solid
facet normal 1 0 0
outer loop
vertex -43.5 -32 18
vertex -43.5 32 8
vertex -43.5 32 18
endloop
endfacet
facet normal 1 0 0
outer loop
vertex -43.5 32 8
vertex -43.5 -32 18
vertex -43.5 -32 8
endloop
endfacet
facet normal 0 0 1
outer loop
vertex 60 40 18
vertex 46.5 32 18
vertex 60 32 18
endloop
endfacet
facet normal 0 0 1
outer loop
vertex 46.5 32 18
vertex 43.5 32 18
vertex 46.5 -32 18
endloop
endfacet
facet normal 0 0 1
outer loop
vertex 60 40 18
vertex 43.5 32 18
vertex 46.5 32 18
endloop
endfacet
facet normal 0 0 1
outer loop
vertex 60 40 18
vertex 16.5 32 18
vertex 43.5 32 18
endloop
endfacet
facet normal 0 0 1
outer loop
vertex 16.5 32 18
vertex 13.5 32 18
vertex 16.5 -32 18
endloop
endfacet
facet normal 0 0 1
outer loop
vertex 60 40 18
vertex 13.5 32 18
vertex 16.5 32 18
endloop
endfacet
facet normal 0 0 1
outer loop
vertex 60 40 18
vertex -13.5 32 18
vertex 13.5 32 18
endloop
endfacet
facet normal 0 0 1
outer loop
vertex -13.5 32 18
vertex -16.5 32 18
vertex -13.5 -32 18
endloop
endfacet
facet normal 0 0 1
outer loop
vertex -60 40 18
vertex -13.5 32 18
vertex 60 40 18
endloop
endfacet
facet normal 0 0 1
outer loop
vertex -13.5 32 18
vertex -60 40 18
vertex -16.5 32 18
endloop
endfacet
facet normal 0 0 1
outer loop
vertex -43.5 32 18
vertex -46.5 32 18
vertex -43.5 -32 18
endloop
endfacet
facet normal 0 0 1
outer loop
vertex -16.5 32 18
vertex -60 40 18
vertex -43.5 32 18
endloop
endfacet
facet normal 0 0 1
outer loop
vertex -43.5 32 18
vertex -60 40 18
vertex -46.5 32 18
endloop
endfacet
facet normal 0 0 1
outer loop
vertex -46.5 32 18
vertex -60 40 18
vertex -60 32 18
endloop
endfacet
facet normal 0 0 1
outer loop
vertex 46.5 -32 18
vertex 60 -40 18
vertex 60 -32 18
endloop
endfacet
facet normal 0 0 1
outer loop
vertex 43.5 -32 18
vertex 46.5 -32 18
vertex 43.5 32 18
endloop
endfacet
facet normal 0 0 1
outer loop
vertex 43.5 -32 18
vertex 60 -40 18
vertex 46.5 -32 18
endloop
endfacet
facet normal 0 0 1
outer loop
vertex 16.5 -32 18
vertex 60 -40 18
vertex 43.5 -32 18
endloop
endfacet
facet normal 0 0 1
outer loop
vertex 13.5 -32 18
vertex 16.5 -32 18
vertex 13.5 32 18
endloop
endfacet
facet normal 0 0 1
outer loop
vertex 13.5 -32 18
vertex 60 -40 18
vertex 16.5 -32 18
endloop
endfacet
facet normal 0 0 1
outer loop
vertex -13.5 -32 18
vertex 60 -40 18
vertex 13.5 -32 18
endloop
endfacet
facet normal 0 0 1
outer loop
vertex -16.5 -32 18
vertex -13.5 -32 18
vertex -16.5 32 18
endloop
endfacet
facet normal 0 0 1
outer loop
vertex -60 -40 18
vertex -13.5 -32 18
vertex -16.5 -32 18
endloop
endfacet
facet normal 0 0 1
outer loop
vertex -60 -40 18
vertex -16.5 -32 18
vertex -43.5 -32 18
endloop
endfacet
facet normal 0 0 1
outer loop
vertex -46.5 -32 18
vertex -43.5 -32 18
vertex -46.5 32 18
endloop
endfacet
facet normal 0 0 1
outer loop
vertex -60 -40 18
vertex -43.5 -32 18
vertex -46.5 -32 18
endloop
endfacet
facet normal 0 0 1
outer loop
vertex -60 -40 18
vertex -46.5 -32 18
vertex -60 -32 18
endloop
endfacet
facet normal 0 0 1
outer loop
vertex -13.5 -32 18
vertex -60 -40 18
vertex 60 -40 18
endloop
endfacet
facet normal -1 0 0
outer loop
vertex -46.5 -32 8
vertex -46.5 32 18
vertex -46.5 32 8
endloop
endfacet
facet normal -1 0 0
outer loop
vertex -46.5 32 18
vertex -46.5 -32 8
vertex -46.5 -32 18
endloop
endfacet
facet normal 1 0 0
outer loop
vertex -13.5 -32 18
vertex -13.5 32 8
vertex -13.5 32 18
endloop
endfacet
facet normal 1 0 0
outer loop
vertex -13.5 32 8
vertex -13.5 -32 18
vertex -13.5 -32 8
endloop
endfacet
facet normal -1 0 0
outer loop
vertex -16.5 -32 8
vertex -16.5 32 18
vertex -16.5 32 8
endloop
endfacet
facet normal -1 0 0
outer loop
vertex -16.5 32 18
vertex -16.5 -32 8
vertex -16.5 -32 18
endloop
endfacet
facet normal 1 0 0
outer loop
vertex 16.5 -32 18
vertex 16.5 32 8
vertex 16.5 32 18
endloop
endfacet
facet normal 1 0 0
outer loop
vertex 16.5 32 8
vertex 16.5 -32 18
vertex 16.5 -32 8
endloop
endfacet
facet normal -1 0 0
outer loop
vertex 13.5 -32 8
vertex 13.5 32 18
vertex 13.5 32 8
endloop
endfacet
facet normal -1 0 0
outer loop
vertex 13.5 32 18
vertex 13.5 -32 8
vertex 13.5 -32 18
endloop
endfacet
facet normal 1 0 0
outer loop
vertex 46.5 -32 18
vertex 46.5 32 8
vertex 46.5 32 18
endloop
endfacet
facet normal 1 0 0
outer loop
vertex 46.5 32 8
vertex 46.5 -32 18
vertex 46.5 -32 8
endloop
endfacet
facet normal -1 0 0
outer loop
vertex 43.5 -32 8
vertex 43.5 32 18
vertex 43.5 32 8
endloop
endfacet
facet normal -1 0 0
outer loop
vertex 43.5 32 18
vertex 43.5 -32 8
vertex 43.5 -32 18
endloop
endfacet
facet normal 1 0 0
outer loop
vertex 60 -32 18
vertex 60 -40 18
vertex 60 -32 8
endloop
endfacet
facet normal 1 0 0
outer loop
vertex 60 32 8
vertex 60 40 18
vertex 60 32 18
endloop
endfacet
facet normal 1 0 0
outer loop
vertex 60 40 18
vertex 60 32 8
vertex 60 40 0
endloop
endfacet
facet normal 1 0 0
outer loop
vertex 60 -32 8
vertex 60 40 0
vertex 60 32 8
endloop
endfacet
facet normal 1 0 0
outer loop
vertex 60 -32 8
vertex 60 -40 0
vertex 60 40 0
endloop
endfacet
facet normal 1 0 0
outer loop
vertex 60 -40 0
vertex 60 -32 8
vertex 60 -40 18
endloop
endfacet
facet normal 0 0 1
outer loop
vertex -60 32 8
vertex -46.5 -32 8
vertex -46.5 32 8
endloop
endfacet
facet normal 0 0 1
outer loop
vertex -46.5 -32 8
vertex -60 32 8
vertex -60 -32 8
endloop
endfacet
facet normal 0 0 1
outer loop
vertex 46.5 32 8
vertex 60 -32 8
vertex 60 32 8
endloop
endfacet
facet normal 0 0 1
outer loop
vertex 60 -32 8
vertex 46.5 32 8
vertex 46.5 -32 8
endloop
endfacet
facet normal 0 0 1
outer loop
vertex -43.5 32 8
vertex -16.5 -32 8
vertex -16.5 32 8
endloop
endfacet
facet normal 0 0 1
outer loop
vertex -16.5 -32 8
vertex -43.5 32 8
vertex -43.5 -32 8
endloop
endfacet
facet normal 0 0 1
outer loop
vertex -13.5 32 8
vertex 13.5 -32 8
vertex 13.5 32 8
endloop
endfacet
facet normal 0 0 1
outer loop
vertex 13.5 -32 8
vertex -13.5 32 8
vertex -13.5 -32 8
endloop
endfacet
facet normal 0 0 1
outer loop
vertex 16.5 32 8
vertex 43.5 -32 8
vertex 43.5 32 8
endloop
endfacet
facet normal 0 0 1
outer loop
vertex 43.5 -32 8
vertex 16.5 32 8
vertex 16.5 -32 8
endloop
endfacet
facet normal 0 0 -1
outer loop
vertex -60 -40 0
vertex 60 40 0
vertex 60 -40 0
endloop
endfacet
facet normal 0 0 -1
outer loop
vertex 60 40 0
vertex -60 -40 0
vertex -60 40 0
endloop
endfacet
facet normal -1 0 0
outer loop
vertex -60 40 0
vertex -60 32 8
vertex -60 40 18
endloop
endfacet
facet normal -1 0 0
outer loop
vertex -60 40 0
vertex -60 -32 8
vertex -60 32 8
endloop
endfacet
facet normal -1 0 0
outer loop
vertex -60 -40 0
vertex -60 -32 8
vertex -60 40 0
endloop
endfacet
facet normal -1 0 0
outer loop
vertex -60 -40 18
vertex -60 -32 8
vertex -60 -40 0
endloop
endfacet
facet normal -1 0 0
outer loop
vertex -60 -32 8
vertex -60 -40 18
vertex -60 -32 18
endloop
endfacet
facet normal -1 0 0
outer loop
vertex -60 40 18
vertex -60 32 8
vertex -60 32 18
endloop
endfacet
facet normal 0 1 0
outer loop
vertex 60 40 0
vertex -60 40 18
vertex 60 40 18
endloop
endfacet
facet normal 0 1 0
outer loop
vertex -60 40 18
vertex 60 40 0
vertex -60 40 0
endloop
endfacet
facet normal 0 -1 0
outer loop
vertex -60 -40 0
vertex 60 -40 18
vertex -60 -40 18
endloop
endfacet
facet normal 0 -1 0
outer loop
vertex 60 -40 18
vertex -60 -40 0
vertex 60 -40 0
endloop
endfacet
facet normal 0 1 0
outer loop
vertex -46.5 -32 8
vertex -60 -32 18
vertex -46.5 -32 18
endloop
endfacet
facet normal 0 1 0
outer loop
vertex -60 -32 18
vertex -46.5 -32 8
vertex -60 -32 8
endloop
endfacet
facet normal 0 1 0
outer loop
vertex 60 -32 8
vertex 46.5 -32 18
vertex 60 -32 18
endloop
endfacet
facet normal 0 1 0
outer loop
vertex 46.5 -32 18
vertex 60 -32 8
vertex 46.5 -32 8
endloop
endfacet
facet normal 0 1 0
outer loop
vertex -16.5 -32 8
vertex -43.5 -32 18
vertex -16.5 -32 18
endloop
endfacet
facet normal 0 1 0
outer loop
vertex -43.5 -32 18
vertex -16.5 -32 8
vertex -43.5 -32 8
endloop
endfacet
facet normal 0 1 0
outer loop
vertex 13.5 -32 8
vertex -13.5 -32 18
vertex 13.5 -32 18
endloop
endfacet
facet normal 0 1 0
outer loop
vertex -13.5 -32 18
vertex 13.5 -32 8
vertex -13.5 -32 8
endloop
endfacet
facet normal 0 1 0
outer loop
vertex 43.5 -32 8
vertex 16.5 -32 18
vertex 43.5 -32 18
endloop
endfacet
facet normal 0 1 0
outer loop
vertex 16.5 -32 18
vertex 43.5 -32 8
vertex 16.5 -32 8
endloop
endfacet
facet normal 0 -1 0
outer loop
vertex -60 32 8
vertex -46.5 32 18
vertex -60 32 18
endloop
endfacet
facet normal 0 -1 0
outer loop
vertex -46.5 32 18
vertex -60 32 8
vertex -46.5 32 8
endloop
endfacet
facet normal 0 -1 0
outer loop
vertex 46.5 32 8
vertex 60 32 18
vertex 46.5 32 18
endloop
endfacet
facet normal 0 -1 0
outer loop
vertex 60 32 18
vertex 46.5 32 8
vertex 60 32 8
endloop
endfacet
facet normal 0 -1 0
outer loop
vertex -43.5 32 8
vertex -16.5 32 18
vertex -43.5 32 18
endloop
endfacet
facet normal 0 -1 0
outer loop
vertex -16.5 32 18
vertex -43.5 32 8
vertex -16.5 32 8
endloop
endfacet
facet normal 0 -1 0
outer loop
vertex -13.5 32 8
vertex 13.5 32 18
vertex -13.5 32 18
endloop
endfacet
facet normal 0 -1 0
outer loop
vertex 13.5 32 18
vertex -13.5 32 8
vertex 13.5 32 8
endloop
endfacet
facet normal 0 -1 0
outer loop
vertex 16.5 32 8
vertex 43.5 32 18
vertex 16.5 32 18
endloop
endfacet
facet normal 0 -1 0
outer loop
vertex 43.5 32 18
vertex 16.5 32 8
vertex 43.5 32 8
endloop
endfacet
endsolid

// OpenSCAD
$fn = 32;

// ----------------------------------------------------------------------
// Rib frame 120 x 80 x 18
// 4 ribs at 30 mm pitch
// ----------------------------------------------------------------------

// --- parameters (mm) ---
frame = [120, 80, 8];  // base plate size (x, y, z)
rail_w = 8;            // side rail width
ribs = 4;              // number of ribs
rib_t = 3;             // rib thickness
rib_h = 10;            // rib height above the base plate
pitch = 30;            // pitch between rib centres

// --- derived feature positions (mm) ---
span = (ribs - 1) * pitch;          // = 90   distance between the outer ribs
origin_x = -span / 2;               // = -45   X of the first rib
rib_len = frame[1] - 2 * rail_w + 2;  // = 66   rib length, 1 mm into each rail
feature_centers = [
  [origin_x + 0 * pitch, 0],
  [origin_x + 1 * pitch, 0],
  [origin_x + 2 * pitch, 0],
  [origin_x + 3 * pitch, 0]
];   // rib centre line, drives the rib loop

// base plate, two side rails, then the ribs read straight off feature_centers
union() {
  translate([-frame[0] / 2, -frame[1] / 2, 0]) cube(frame);
  translate([-frame[0] / 2, -frame[1] / 2, 0]) cube([frame[0], rail_w, frame[2] + rib_h]);
  translate([-frame[0] / 2, frame[1] / 2 - rail_w, 0]) cube([frame[0], rail_w, frame[2] + rib_h]);
  for (centre = feature_centers)
    translate([centre[0] - rib_t / 2, centre[1] - rib_len / 2, frame[2] - 1])
      cube([rib_t, rib_len, rib_h + 1]);
}
